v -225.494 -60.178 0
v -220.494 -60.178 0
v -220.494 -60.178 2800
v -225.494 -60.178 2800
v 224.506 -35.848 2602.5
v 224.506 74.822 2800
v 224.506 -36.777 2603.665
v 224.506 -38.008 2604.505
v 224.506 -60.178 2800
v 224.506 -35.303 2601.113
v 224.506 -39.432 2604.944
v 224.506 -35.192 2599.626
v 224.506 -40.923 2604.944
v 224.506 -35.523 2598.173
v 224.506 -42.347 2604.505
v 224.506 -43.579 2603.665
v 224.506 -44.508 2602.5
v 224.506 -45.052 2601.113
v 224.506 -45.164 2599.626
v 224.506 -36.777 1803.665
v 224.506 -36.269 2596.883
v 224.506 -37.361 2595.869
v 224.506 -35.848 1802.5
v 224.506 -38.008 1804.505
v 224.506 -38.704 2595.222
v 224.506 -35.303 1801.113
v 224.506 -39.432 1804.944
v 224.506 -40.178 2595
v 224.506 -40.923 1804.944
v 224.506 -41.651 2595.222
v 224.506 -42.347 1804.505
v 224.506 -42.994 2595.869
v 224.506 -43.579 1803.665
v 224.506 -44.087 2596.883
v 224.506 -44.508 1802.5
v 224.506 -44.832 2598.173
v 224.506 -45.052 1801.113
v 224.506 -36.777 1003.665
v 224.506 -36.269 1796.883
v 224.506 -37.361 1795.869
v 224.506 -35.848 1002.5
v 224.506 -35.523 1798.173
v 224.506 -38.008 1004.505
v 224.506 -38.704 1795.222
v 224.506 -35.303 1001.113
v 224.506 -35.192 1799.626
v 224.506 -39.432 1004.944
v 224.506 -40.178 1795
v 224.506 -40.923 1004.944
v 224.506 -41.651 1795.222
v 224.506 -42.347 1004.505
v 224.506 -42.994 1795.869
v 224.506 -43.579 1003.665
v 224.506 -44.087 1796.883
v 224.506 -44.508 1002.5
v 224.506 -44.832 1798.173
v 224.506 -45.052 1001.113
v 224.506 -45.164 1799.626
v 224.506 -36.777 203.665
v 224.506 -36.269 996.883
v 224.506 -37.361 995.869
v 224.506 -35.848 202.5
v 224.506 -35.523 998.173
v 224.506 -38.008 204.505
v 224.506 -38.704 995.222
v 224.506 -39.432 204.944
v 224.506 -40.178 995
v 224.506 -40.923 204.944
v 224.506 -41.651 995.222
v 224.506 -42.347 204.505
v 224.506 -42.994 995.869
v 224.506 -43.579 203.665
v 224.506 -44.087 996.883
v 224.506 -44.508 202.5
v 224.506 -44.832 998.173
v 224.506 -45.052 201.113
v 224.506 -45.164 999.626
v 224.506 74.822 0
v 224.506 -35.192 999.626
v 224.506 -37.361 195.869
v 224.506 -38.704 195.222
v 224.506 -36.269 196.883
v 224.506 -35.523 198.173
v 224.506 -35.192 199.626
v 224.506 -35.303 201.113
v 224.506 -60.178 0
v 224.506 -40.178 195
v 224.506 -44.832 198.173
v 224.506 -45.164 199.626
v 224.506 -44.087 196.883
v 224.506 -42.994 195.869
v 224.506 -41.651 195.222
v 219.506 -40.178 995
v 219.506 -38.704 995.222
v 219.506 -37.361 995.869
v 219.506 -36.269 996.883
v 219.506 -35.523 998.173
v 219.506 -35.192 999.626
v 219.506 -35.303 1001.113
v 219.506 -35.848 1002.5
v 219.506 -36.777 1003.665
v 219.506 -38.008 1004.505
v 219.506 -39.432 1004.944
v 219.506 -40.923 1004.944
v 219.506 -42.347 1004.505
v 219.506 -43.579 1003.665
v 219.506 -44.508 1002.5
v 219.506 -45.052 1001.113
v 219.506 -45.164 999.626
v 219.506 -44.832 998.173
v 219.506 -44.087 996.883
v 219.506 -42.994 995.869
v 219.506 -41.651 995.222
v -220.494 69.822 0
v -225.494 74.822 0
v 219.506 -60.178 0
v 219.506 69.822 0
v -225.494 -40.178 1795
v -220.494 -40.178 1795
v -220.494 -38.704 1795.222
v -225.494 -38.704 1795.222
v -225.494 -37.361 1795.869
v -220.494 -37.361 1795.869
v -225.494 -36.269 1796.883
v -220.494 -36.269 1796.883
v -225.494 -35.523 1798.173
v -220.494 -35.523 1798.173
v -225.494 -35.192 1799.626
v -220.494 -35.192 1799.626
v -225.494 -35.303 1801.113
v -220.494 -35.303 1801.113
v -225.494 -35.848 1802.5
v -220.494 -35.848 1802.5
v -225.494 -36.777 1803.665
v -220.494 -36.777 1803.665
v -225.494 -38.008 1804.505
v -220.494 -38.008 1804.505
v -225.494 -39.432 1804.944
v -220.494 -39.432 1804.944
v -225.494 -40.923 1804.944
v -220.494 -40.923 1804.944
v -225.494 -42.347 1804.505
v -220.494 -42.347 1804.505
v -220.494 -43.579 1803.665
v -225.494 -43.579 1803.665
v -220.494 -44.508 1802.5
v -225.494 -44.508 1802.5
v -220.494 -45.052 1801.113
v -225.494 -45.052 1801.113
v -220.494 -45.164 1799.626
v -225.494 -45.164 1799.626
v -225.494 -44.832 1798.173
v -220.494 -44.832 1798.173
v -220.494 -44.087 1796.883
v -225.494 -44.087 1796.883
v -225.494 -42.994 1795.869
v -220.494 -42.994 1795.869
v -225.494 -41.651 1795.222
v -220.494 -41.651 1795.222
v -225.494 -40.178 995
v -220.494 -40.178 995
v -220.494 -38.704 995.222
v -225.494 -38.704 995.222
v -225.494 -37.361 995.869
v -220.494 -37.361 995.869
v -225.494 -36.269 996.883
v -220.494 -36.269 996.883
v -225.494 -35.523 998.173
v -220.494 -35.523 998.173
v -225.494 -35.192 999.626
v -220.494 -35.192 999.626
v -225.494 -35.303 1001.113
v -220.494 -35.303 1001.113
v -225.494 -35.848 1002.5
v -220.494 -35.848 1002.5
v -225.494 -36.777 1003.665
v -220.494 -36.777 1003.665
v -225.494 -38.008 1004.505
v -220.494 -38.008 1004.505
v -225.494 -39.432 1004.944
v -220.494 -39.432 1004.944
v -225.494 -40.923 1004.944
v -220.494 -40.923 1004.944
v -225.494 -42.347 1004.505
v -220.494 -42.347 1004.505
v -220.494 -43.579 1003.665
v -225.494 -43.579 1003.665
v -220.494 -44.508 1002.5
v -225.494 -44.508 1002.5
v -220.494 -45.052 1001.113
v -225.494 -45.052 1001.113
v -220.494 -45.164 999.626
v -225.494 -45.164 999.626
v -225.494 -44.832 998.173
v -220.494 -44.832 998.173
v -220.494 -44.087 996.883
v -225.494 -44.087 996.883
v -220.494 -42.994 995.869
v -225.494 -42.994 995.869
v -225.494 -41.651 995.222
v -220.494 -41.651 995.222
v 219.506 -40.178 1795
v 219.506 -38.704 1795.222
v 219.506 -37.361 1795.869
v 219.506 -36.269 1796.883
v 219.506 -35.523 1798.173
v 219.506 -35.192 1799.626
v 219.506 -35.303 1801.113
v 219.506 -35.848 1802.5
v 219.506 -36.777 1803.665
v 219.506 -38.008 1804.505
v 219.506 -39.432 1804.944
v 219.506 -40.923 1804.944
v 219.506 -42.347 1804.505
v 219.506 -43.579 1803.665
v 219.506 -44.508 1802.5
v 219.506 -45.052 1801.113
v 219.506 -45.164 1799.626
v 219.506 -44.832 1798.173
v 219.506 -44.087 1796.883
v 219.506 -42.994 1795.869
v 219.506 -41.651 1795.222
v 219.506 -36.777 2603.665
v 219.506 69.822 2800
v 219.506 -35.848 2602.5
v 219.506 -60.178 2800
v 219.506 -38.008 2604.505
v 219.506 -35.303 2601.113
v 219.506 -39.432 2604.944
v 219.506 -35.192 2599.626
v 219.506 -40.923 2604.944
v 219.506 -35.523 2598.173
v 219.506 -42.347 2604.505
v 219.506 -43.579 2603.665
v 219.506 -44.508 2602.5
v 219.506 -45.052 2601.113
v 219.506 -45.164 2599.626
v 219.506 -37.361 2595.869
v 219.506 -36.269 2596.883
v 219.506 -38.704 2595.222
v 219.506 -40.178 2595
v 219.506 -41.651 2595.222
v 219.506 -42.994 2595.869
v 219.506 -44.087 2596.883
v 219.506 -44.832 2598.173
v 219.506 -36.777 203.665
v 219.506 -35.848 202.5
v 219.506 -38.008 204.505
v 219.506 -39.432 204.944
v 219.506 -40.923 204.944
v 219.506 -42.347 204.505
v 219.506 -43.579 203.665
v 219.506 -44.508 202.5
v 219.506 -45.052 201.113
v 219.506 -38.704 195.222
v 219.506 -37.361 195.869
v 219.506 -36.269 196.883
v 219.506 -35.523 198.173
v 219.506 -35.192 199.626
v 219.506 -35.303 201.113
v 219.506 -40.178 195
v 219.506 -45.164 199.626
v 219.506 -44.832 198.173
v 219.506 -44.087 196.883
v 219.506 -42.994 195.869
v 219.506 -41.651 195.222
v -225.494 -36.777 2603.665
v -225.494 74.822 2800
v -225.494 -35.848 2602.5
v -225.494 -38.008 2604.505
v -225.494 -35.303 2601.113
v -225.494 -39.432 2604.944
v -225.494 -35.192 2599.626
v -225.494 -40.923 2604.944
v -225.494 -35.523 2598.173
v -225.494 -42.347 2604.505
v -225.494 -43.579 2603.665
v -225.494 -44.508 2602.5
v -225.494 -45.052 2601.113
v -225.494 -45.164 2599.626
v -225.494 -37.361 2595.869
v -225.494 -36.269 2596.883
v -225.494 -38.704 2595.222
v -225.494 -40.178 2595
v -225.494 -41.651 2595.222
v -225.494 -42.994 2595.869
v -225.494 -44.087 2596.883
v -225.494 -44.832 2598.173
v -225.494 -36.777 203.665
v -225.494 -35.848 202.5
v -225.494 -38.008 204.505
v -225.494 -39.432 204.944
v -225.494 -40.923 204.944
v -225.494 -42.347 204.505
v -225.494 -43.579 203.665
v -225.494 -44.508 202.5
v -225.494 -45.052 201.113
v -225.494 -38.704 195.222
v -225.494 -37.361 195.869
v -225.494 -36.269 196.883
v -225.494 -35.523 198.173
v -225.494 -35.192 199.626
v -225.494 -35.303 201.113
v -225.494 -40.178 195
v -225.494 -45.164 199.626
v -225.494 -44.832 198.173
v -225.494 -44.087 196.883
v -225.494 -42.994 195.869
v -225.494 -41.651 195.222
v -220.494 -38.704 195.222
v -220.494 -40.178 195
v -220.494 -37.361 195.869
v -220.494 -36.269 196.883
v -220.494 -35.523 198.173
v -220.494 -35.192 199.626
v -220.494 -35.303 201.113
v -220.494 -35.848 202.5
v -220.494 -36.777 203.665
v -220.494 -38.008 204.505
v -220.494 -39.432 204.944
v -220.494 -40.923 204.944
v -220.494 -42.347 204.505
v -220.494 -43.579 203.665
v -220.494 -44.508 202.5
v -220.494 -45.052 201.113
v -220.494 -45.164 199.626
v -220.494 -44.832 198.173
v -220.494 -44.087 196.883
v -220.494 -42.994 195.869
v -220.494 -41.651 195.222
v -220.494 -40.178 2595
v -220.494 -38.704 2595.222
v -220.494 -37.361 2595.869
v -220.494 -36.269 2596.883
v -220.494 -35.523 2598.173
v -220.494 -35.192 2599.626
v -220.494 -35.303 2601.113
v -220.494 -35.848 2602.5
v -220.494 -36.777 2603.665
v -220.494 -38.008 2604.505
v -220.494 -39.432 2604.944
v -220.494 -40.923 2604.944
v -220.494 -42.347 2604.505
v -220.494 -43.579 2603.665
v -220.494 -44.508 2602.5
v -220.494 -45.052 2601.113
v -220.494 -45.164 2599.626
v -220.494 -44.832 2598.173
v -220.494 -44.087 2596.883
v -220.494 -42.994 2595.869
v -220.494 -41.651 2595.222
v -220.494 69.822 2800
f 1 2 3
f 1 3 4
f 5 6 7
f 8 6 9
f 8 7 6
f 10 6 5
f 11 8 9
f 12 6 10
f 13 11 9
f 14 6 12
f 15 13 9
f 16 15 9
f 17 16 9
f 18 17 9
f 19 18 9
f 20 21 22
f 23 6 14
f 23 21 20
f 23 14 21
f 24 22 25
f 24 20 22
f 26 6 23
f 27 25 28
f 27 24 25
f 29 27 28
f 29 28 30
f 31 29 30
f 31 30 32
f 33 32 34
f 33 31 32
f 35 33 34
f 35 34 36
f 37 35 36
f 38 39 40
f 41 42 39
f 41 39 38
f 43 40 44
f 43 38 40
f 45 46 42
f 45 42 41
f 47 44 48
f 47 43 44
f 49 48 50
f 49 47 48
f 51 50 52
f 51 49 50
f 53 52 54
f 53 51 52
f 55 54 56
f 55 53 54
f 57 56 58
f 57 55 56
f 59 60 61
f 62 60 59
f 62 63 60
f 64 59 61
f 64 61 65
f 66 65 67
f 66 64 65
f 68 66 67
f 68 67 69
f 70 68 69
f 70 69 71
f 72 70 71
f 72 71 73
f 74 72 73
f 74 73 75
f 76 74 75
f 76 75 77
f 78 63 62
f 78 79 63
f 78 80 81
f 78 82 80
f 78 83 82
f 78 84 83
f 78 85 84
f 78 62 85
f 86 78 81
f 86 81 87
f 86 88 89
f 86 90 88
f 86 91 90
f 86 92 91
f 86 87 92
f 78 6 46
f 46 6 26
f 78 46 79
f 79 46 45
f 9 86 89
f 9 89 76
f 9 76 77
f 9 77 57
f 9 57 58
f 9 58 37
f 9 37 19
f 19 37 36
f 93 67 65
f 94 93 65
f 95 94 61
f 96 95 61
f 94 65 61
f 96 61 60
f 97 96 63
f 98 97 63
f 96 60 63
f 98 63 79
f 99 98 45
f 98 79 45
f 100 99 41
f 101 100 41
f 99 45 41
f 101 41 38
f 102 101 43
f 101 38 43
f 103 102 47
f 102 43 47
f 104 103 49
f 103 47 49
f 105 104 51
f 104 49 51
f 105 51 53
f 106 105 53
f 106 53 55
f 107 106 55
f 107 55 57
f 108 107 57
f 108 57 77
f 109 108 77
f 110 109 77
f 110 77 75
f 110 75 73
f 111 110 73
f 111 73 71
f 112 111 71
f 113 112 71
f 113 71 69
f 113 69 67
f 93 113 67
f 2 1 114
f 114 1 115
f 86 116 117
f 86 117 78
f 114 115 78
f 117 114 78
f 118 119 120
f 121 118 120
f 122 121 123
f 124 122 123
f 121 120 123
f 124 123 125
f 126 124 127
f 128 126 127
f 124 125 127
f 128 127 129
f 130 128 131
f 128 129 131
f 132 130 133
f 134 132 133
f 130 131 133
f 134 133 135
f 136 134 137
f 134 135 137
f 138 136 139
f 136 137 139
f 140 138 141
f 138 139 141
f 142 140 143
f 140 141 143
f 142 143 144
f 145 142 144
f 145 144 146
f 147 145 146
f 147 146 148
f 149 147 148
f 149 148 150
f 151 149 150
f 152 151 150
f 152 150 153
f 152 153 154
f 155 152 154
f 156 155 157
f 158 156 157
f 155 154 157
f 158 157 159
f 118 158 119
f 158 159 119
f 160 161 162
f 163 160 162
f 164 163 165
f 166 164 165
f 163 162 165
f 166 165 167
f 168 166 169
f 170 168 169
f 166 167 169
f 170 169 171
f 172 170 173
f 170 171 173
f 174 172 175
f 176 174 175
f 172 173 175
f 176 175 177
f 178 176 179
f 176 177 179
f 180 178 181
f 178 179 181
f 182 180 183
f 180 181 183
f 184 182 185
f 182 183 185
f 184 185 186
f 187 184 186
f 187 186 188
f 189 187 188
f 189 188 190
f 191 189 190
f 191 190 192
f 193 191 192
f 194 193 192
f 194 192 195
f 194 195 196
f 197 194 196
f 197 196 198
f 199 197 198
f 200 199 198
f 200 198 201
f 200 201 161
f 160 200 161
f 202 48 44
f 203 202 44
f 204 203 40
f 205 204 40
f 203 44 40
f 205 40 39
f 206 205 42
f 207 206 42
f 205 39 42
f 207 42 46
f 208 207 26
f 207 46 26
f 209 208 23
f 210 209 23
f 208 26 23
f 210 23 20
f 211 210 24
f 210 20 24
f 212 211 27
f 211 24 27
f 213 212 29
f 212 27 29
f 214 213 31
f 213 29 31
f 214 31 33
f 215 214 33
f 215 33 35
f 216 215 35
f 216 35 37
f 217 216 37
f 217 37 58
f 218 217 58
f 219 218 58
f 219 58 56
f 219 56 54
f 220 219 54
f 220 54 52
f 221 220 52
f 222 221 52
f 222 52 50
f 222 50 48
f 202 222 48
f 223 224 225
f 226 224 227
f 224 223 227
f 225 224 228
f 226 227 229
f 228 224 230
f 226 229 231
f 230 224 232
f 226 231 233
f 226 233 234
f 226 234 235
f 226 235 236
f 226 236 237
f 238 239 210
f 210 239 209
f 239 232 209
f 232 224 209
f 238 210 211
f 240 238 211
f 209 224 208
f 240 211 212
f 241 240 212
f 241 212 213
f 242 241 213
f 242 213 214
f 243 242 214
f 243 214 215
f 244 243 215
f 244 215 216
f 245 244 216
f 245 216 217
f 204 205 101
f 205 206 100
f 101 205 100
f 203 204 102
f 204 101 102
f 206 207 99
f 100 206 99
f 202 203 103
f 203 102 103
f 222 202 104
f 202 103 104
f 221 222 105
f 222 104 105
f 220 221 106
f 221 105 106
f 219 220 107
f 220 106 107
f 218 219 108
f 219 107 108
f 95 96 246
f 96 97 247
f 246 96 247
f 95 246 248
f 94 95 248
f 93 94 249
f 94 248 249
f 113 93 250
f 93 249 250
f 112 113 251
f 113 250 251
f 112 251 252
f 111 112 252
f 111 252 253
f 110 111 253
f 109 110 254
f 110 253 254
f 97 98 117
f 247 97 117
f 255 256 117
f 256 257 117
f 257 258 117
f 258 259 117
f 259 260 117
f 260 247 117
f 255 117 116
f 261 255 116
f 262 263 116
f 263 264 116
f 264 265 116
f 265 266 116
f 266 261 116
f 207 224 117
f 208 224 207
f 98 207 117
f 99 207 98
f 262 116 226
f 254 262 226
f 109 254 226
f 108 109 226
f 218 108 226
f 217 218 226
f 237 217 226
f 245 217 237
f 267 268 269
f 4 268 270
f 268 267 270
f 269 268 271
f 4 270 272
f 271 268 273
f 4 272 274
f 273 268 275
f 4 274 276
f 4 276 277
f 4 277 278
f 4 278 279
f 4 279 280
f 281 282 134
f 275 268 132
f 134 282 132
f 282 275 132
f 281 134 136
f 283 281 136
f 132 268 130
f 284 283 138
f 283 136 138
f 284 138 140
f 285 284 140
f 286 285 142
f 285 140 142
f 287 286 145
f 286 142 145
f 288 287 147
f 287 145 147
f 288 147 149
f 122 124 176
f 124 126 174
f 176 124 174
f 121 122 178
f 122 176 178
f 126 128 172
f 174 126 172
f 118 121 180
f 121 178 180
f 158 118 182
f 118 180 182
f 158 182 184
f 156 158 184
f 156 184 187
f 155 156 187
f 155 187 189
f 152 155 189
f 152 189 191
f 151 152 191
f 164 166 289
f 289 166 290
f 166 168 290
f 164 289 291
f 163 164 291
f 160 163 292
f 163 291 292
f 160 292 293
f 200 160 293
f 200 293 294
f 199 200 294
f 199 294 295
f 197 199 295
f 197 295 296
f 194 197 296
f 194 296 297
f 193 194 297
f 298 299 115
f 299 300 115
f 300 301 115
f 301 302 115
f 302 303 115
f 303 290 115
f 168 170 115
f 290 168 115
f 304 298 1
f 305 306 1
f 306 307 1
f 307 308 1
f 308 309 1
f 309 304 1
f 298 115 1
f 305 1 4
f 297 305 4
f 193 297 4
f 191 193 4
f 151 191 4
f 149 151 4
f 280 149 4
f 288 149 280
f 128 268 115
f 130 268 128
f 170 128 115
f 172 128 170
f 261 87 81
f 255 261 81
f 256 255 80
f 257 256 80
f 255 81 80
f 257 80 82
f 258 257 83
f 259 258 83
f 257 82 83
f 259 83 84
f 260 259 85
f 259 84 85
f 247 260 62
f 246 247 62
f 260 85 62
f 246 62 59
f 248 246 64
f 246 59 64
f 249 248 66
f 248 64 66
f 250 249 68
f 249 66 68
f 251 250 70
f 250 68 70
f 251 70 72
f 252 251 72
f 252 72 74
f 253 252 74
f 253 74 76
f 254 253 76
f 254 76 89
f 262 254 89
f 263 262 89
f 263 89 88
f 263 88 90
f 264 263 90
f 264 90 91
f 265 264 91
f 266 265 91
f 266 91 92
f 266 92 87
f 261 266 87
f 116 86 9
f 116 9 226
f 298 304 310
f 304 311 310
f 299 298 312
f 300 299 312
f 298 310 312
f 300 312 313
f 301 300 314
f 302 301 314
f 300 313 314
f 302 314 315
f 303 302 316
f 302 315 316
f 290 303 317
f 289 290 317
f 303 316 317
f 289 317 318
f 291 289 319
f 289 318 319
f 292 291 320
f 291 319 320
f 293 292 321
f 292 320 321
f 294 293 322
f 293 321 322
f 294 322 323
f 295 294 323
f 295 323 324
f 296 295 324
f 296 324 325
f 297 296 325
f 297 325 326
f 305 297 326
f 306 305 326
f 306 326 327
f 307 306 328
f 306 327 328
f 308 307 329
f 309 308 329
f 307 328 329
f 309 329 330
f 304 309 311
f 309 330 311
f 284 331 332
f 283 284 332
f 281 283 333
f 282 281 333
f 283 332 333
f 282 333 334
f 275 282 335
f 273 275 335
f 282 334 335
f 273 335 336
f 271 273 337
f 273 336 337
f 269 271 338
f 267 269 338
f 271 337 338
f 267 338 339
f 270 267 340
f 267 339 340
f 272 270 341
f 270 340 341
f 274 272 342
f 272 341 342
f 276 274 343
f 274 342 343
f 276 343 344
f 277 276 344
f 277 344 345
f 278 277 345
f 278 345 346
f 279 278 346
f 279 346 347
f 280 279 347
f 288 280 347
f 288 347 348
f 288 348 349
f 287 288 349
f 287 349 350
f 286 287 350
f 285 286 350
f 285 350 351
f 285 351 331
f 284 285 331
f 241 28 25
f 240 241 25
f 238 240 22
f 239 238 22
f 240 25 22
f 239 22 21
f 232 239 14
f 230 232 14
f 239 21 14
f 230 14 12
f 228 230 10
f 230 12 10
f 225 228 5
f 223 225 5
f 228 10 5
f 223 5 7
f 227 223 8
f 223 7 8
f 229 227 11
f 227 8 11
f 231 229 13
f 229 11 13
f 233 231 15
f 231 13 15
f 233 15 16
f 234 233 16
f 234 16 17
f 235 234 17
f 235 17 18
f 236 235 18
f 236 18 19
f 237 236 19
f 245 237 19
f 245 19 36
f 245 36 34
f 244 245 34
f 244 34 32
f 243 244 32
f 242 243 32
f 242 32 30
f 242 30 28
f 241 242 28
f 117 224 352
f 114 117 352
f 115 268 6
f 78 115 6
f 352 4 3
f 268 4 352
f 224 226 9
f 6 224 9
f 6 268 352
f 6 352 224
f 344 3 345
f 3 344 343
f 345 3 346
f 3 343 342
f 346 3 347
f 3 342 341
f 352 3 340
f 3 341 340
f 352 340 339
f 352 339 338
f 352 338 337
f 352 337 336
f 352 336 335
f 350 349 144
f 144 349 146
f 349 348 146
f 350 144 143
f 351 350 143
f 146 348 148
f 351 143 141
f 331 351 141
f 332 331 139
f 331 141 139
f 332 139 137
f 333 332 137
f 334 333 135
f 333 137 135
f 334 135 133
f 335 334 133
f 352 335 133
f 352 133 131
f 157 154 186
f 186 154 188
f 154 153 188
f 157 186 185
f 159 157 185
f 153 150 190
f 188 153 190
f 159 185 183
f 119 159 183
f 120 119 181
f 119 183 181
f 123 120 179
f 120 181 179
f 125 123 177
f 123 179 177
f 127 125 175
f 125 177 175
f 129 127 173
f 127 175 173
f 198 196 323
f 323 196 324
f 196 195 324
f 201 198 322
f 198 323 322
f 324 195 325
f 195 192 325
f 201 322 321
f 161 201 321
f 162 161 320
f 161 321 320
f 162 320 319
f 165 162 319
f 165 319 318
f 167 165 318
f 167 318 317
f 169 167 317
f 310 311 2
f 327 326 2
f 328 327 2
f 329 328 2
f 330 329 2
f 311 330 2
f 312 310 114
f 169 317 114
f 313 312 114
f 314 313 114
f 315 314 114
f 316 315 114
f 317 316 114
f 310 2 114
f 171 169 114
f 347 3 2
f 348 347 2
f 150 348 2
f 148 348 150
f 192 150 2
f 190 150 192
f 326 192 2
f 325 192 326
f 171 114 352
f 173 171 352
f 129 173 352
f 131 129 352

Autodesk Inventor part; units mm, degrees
ref_plane "YZ Plane" through (0, 0, 0) normal (1, 0, 0) x (0, 1, 0)
ref_plane "XZ Plane" through (0, 0, 0) normal (0, 1, 0) x (-1, 0, 0)
ref_plane "XY Plane" through (0, 0, 0) normal (0, 0, 1) x (1, 0, 0)
sketch "Esboço1" plane through (0, 0, 0) normal (0, 0, 1) x (1, 0, 0)
  line L0 (-220.4936, -60.1777) -> (-220.4936, -0.1777)
  line L1 (219.5064, -0.1777) -> (219.5064, -60.1777)
  line L2 (224.5064, -60.1777) -> (224.5064, 4.8223)
  line L3 (-225.4936, 4.8223) -> (-225.4936, -60.1777)
  line L4 (-225.4936, 4.8223) -> (-225.4936, 74.8223)
  line L5 (-225.4936, 74.8223) -> (224.5064, 74.8223)
  line L6 (224.5064, 74.8223) -> (224.5064, 4.8223)
  line L7 (219.5064, -60.1777) -> (219.5064, 4.8223)
  line L8 (219.5064, 4.8223) -> (219.5064, 69.8223)
  line L9 (219.5064, 69.8223) -> (-220.4936, 69.8223)
  line L10 (-220.4936, 69.8223) -> (-220.4936, 4.8223)
  line L11 (-220.4936, 4.8223) -> (-220.4936, -60.1777)
  line L12 (-220.4936, -60.1777) -> (-225.4936, -60.1777)
  line L13 (224.5064, -60.1777) -> (219.5064, -60.1777)
  point P0 (0, 0)
  dimension "d0" = 60
  dimension "d1" = 440
  dimension "d2" = 70
  dimension "d3" = 5
extrude "Extrusão1" add sketch "Esboço1" along normal blind 2800
sketch "Esboço2" plane through (224.5064, -60.1777, 0) normal (1, 0, 0) x (0, 0, -1)
  line L0 (0, 0) -> (-2800, 0) projected
  line L1 (0, 0) -> (-2800, 0)
  line L2 (-2800, 0) -> (-2800, 40)
  line L3 (-2800, 40) -> (0, 40)
  line L4 (0, 40) -> (0, 0)
  circle A0 centre (-200, 20) radius 5
  circle A1 centre (-1000, 20) radius 5
  circle A2 centre (-1800, 20) radius 5
  circle A3 centre (-2600, 20) radius 5
  point P0 (0, 60.1777)
  dimension "d6" = 2800
  dimension "d7" = 40
  dimension "d8" = 10
  dimension "d9" = 10
  dimension "d10" = 10
  dimension "d11" = 10
  dimension "d12" = 20
  dimension "d13" = 20
  dimension "d14" = 20
  dimension "d15" = 20
  dimension "d16" = 800
  dimension "d17" = 800
  dimension "d18" = 800
  dimension "d19" = 200
extrude "Extrusão2" cut sketch "Esboço2" against normal through all contours A0 | A1 | A2 | A3
properties part number "Teste Placa" material "Policarbonato, transparente"
